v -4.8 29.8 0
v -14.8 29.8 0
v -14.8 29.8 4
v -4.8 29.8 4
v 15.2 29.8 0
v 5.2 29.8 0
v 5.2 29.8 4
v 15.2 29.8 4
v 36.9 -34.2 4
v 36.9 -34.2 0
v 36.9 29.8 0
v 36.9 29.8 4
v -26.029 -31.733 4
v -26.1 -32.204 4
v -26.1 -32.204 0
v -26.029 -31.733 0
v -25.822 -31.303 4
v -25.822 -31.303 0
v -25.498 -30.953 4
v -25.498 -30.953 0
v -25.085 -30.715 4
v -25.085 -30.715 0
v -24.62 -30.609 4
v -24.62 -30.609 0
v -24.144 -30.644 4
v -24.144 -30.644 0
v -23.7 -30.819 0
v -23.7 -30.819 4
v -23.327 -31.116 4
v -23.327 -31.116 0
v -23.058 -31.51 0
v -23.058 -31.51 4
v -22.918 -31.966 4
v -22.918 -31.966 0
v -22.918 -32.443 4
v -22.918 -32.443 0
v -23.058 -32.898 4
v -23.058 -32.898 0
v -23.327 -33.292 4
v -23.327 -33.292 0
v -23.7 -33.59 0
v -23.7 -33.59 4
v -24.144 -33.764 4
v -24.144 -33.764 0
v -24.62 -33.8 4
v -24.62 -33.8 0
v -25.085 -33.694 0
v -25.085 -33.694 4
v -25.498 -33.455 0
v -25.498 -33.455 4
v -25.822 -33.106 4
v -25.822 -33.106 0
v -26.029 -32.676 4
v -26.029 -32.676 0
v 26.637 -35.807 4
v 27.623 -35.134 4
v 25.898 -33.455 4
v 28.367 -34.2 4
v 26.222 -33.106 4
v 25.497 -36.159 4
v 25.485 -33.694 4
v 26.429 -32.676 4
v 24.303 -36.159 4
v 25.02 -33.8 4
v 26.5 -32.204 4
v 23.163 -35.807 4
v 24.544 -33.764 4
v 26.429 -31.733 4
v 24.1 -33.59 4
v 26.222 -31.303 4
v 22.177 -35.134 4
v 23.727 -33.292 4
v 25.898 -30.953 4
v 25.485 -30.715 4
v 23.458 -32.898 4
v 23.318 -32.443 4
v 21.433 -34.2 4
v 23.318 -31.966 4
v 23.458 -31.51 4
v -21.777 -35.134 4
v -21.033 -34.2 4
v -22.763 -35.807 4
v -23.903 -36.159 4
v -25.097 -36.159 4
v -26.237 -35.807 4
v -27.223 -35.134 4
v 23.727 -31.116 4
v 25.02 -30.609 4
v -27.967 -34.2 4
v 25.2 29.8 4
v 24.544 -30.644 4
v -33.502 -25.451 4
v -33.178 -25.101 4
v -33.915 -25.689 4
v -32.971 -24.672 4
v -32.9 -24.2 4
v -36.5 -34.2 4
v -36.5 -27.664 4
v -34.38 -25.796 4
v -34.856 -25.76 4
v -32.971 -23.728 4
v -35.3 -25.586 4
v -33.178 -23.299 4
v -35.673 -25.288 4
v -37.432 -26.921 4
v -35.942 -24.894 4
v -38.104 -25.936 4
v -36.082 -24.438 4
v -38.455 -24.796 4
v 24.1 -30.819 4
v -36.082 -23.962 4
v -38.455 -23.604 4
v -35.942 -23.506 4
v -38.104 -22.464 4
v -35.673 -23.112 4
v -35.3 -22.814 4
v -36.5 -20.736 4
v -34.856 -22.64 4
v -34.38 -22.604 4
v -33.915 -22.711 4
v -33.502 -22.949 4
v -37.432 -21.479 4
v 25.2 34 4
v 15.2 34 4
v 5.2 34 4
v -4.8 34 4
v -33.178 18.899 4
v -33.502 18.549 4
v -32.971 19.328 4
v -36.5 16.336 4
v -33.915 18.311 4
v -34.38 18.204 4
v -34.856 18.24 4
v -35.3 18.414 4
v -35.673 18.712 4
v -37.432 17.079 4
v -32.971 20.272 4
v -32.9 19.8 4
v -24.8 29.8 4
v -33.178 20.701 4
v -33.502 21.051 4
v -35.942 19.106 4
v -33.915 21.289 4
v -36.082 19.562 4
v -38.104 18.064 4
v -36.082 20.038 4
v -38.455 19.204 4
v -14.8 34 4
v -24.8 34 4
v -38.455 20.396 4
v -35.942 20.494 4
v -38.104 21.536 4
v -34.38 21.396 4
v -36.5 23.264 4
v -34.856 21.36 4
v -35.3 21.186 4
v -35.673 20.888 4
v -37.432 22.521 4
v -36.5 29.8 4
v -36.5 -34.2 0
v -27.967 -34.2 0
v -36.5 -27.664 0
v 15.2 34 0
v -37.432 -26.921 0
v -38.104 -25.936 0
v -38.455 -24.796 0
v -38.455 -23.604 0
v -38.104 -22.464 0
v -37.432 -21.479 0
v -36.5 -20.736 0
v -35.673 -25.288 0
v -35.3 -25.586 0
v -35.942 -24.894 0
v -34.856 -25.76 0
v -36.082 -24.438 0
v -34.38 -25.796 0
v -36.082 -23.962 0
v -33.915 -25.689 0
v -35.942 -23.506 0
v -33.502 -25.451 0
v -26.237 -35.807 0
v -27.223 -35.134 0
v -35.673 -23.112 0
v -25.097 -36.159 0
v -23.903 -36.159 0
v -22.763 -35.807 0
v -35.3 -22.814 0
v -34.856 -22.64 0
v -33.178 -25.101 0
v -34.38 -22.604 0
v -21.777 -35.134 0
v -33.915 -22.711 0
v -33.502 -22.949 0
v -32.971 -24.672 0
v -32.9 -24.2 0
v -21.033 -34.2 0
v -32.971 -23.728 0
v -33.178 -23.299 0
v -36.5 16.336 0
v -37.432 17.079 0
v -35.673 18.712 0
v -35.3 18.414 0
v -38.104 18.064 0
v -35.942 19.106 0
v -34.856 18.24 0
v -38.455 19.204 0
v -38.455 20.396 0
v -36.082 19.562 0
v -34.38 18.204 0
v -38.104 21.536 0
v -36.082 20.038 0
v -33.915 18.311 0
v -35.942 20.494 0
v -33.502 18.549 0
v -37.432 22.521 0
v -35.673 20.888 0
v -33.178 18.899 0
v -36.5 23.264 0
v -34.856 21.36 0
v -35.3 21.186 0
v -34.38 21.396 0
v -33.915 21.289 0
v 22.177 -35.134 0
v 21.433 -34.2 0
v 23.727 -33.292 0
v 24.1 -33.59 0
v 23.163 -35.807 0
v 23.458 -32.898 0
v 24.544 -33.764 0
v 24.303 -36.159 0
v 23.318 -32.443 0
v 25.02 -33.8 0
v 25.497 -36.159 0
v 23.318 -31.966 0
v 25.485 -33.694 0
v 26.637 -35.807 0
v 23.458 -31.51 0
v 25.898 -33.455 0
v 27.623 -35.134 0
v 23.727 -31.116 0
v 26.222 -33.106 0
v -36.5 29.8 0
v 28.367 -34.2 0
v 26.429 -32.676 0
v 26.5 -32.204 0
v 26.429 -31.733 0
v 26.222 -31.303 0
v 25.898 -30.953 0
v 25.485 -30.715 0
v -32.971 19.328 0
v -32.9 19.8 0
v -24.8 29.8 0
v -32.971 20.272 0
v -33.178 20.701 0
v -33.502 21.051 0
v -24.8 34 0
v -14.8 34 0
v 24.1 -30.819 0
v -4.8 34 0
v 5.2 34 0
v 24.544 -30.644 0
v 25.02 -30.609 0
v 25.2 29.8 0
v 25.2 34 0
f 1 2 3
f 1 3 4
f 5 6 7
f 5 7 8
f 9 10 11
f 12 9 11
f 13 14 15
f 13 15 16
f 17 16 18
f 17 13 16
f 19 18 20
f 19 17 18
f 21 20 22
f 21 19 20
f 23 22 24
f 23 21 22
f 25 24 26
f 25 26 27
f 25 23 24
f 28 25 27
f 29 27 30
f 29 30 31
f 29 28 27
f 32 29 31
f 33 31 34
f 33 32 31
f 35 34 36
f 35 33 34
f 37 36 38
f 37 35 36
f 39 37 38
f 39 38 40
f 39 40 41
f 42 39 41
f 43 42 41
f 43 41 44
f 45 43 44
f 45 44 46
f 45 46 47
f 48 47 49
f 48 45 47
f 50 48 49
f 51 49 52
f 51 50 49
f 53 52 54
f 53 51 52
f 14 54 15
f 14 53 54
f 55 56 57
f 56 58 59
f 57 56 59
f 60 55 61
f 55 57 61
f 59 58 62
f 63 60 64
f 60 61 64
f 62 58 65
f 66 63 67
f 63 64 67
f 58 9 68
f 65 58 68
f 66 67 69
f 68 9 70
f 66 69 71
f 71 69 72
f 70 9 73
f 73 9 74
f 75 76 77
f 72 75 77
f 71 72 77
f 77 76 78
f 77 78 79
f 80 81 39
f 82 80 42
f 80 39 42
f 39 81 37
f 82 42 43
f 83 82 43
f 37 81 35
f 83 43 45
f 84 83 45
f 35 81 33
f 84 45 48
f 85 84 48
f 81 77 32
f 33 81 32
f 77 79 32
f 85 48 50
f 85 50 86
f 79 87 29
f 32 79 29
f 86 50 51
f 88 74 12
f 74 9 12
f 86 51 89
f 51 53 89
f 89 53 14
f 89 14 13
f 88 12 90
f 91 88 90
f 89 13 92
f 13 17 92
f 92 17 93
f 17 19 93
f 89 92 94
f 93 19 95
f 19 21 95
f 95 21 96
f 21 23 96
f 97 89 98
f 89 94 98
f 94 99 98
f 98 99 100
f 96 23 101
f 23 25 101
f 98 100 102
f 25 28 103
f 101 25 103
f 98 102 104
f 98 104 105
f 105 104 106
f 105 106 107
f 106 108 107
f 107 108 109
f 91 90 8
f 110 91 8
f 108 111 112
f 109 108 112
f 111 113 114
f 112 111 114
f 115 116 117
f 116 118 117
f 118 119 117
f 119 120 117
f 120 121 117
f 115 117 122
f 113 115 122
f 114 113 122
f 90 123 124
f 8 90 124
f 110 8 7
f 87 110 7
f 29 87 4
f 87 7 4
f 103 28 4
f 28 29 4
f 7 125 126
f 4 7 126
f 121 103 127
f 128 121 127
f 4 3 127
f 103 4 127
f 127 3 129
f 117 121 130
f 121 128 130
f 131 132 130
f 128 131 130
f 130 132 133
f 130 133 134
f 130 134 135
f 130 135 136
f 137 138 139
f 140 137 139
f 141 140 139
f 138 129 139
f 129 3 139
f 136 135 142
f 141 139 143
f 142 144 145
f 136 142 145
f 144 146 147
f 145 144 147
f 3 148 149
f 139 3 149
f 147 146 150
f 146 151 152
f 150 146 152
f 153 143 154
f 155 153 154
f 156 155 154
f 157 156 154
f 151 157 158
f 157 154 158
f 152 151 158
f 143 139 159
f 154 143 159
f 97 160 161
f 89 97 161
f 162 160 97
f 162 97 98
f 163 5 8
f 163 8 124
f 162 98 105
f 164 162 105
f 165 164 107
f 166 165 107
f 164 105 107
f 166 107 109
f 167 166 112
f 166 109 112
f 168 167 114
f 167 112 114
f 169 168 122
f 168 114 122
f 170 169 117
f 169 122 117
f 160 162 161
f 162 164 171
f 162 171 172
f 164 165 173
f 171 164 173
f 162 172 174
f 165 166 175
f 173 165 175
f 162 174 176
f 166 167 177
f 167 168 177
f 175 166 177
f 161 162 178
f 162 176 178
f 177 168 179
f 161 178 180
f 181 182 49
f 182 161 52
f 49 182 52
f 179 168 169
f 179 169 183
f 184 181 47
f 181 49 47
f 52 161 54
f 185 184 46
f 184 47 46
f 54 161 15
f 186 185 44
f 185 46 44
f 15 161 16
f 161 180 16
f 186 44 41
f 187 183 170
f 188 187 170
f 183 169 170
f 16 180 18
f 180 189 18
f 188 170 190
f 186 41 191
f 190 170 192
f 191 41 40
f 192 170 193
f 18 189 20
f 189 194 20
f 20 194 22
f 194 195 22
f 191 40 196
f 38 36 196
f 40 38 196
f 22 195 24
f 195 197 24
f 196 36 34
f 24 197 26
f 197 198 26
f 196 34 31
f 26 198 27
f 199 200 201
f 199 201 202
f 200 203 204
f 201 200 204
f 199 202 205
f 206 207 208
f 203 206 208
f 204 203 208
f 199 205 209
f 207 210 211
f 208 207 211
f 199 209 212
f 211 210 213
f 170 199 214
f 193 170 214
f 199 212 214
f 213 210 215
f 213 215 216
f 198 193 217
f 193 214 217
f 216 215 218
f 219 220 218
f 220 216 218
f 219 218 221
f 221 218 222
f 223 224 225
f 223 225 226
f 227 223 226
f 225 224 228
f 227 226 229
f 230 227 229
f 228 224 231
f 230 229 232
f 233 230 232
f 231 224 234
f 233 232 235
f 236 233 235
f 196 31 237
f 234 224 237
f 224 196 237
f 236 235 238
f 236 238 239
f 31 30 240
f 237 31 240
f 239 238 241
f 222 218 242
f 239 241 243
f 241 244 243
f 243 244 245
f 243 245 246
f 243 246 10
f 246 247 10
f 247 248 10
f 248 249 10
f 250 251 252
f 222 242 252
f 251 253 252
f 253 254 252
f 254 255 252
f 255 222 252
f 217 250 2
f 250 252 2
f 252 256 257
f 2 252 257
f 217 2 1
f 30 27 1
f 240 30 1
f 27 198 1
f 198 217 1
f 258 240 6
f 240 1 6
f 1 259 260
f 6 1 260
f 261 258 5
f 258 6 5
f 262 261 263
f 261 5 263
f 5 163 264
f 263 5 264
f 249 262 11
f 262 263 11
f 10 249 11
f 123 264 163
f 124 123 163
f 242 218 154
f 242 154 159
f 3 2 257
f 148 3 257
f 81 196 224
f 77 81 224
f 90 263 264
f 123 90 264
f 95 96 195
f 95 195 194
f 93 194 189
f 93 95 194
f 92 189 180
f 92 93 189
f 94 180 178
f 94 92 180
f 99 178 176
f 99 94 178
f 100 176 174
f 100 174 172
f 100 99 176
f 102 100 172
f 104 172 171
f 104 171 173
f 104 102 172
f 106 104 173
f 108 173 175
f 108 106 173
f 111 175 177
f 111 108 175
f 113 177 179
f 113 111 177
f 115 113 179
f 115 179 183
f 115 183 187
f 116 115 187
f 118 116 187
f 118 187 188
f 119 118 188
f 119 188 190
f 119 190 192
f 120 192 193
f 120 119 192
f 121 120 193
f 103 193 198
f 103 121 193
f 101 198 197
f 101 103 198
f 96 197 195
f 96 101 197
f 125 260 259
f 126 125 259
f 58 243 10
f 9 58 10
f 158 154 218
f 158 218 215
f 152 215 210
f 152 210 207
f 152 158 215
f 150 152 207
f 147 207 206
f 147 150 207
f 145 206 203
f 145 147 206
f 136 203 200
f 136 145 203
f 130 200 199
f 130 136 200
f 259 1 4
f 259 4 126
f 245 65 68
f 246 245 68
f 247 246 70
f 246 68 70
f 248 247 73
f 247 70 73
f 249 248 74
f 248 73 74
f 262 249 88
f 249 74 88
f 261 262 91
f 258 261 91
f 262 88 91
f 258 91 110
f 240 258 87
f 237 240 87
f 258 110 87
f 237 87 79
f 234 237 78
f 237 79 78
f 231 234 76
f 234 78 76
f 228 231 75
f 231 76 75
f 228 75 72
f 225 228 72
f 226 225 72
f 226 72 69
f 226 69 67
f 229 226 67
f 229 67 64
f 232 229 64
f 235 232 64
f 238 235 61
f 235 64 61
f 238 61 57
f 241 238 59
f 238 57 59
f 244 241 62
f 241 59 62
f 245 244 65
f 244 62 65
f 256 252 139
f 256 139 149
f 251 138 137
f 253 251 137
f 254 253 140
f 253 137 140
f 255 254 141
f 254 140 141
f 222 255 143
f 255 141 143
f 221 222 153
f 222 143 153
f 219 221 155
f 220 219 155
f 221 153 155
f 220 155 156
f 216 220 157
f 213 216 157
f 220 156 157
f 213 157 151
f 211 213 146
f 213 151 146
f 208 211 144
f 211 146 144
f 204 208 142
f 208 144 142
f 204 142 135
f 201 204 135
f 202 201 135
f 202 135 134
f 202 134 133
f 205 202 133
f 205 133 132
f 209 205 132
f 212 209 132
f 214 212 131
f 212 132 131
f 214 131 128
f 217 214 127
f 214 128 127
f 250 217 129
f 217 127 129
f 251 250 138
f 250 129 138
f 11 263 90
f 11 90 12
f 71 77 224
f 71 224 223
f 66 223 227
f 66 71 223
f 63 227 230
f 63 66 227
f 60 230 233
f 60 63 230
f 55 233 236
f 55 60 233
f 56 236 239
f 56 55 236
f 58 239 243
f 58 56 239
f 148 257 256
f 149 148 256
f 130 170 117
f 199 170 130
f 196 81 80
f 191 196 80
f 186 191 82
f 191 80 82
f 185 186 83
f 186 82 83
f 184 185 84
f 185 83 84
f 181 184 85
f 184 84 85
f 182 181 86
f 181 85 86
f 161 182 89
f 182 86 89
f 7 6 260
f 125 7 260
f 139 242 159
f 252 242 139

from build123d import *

# Parameters (mm, degrees)
SKETCH1_W             = 73.400000004
SKETCH1_H             = 64
BOSS_EXTRUDE1_DEPTH   = 4
BOSS_EXTRUDE2_DEPTH   = 4
SKETCH2_3_R           = 1.6
CUT_EXTRUDE1_DEPTH    = 4
BOSS_EXTRUDE3_DEPTH   = 4
SKETCH2_5_R           = 1.6
CUT_EXTRUDE2_DEPTH    = 4
SKETCH3_W             = 10
SKETCH3_H             = 4.5
BOSS_EXTRUDE4_DEPTH   = 4
BOSS_EXTRUDE4_2_DEPTH = 4
BOSS_EXTRUDE4_3_DEPTH = 4


with BuildPart() as part:
    # Sketch1 → Boss-Extrude1 (new body)
    with BuildSketch(Plane.XY):
        with Locations((0.200000002, -2.2)):
            Rectangle(SKETCH1_W, SKETCH1_H)
    extrude(amount=BOSS_EXTRUDE1_DEPTH)

    # Sketch2 → Boss-Extrude2 (add)
    with BuildSketch(Plane.XY.offset(4)):
        with BuildLine():
            ThreePointArc((21.433466103, -34.2), (24.9, -36.204218764), (28.366533897, -34.2))
            Line((28.366533897, -34.2), (21.433466103, -34.2))
        make_face()
    boss_extrude2 = extrude(amount=-BOSS_EXTRUDE2_DEPTH)

    # Sketch2<3> → Cut-Extrude1 (cut)
    with BuildSketch(Plane.XY.offset(4)):
        with Locations((24.9, -32.204218764)):
            Circle(SKETCH2_3_R)
    cut_extrude1 = extrude(amount=-CUT_EXTRUDE1_DEPTH, mode=Mode.SUBTRACT)

    # Mirror1: Boss-Extrude2, Cut-Extrude1 across plane
    add(boss_extrude2.mirror(Plane(origin=(0.200000002, 0, 0), x_dir=(0, 0, 1), z_dir=(1, 0, 0))))
    add(cut_extrude1.mirror(Plane(origin=(0.200000002, 0, 0), x_dir=(0, 0, 1), z_dir=(1, 0, 0))), mode=Mode.SUBTRACT)

    # Sketch2<4> → Boss-Extrude3 (add)
    with BuildSketch(Plane.XY.offset(4)):
        with BuildLine():
            ThreePointArc((-36.5, 23.264101615), (-38.5, 19.8), (-36.5, 16.335898385))
            Line((-36.5, 16.335898385), (-36.5, 23.264101615))
        make_face()
    boss_extrude3 = extrude(amount=-BOSS_EXTRUDE3_DEPTH)

    # Sketch2<5> → Cut-Extrude2 (cut)
    with BuildSketch(Plane.XY.offset(4)):
        with Locations((-34.5, 19.8)):
            Circle(SKETCH2_5_R)
    cut_extrude2 = extrude(amount=-CUT_EXTRUDE2_DEPTH, mode=Mode.SUBTRACT)

    # Mirror3: Boss-Extrude3, Cut-Extrude2 across plane
    add(boss_extrude3.mirror(Plane(origin=(0, -2.2, 0), x_dir=(0, 0, 1), z_dir=(0, -1, 0))))
    add(cut_extrude2.mirror(Plane(origin=(0, -2.2, 0), x_dir=(0, 0, 1), z_dir=(0, -1, 0))), mode=Mode.SUBTRACT)


with BuildPart() as body_2:
    # Sketch3 → Boss-Extrude4 (new body)
    with BuildSketch(Plane(origin=(0, 0, 0), x_dir=(-1, 0, 0), z_dir=(0, 0, -1))):
        with Locations((-20.200000004, 31.75)):
            Rectangle(SKETCH3_W, SKETCH3_H)
    extrude(amount=-BOSS_EXTRUDE4_DEPTH)


with BuildPart() as body_3:
    # Sketch3 → Boss-Extrude4 2 (new body)
    with BuildSketch(Plane(origin=(0, 0, 0), x_dir=(-1, 0, 0), z_dir=(0, 0, -1))):
        with Locations((-0.200000004, 31.75)):
            Rectangle(SKETCH3_W, SKETCH3_H)
    extrude(amount=-BOSS_EXTRUDE4_2_DEPTH)


with BuildPart() as body_4:
    # Sketch3 → Boss-Extrude4 3 (new body)
    with BuildSketch(Plane(origin=(0, 0, 0), x_dir=(-1, 0, 0), z_dir=(0, 0, -1))):
        with Locations((19.799999996, 31.75)):
            Rectangle(SKETCH3_W, SKETCH3_H)
    extrude(amount=-BOSS_EXTRUDE4_3_DEPTH)


with BuildPart() as body_2_1:
    add(body_2.part)

    # Combine1: union part, body 3, body 4
    add(part.part)
    add(body_3.part)
    add(body_4.part)


solid = body_2_1.part
